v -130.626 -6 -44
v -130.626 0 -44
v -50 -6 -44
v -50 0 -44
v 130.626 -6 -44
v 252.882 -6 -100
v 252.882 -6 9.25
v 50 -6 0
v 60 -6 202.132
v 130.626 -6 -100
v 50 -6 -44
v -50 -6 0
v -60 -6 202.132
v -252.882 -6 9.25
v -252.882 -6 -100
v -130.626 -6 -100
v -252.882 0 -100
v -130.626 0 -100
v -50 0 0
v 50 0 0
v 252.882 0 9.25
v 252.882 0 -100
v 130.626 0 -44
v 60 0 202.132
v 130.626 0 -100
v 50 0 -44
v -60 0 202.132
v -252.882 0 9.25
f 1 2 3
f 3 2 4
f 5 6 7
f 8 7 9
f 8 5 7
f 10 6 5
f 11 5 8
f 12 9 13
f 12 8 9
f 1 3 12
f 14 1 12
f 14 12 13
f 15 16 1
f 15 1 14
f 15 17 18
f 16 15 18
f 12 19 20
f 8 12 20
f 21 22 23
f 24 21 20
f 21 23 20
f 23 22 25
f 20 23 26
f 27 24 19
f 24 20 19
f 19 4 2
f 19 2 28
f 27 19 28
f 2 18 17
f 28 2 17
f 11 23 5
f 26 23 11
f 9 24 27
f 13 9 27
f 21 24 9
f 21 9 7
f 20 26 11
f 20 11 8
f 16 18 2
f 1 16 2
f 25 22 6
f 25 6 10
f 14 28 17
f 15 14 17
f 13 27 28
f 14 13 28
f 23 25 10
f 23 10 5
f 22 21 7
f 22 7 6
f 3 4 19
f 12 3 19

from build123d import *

# Parameters (mm, degrees)
SM_BASE_FLANGE_1_DEPTH = 6


# Sheet-metal steps are written as plain solids
with BuildPart() as part:
    # Sketch 1 → Базовая кромка1 (new body)
    with BuildSketch(Plane(origin=(0, 0, 0), x_dir=(1, 0, 0), z_dir=(0, 1, 0))):
        Polygon((0, -202.132034356), (60, -202.132034356), (252.882034356, -9.25), (252.882034356, 100), (130.626438318, 100), (130.626438318, 44), (50, 44), (50, 0), (0, 0), align=None)
    extrude(amount=-SM_BASE_FLANGE_1_DEPTH)

    # Зеркальное отражение1: part across plane


with BuildPart() as part_1:
    add(part.part)
    add(part.part.mirror(Plane(origin=(0, -6, 0), x_dir=(0, 0, 1), z_dir=(-1, 0, 0))))


solid = part_1.part
